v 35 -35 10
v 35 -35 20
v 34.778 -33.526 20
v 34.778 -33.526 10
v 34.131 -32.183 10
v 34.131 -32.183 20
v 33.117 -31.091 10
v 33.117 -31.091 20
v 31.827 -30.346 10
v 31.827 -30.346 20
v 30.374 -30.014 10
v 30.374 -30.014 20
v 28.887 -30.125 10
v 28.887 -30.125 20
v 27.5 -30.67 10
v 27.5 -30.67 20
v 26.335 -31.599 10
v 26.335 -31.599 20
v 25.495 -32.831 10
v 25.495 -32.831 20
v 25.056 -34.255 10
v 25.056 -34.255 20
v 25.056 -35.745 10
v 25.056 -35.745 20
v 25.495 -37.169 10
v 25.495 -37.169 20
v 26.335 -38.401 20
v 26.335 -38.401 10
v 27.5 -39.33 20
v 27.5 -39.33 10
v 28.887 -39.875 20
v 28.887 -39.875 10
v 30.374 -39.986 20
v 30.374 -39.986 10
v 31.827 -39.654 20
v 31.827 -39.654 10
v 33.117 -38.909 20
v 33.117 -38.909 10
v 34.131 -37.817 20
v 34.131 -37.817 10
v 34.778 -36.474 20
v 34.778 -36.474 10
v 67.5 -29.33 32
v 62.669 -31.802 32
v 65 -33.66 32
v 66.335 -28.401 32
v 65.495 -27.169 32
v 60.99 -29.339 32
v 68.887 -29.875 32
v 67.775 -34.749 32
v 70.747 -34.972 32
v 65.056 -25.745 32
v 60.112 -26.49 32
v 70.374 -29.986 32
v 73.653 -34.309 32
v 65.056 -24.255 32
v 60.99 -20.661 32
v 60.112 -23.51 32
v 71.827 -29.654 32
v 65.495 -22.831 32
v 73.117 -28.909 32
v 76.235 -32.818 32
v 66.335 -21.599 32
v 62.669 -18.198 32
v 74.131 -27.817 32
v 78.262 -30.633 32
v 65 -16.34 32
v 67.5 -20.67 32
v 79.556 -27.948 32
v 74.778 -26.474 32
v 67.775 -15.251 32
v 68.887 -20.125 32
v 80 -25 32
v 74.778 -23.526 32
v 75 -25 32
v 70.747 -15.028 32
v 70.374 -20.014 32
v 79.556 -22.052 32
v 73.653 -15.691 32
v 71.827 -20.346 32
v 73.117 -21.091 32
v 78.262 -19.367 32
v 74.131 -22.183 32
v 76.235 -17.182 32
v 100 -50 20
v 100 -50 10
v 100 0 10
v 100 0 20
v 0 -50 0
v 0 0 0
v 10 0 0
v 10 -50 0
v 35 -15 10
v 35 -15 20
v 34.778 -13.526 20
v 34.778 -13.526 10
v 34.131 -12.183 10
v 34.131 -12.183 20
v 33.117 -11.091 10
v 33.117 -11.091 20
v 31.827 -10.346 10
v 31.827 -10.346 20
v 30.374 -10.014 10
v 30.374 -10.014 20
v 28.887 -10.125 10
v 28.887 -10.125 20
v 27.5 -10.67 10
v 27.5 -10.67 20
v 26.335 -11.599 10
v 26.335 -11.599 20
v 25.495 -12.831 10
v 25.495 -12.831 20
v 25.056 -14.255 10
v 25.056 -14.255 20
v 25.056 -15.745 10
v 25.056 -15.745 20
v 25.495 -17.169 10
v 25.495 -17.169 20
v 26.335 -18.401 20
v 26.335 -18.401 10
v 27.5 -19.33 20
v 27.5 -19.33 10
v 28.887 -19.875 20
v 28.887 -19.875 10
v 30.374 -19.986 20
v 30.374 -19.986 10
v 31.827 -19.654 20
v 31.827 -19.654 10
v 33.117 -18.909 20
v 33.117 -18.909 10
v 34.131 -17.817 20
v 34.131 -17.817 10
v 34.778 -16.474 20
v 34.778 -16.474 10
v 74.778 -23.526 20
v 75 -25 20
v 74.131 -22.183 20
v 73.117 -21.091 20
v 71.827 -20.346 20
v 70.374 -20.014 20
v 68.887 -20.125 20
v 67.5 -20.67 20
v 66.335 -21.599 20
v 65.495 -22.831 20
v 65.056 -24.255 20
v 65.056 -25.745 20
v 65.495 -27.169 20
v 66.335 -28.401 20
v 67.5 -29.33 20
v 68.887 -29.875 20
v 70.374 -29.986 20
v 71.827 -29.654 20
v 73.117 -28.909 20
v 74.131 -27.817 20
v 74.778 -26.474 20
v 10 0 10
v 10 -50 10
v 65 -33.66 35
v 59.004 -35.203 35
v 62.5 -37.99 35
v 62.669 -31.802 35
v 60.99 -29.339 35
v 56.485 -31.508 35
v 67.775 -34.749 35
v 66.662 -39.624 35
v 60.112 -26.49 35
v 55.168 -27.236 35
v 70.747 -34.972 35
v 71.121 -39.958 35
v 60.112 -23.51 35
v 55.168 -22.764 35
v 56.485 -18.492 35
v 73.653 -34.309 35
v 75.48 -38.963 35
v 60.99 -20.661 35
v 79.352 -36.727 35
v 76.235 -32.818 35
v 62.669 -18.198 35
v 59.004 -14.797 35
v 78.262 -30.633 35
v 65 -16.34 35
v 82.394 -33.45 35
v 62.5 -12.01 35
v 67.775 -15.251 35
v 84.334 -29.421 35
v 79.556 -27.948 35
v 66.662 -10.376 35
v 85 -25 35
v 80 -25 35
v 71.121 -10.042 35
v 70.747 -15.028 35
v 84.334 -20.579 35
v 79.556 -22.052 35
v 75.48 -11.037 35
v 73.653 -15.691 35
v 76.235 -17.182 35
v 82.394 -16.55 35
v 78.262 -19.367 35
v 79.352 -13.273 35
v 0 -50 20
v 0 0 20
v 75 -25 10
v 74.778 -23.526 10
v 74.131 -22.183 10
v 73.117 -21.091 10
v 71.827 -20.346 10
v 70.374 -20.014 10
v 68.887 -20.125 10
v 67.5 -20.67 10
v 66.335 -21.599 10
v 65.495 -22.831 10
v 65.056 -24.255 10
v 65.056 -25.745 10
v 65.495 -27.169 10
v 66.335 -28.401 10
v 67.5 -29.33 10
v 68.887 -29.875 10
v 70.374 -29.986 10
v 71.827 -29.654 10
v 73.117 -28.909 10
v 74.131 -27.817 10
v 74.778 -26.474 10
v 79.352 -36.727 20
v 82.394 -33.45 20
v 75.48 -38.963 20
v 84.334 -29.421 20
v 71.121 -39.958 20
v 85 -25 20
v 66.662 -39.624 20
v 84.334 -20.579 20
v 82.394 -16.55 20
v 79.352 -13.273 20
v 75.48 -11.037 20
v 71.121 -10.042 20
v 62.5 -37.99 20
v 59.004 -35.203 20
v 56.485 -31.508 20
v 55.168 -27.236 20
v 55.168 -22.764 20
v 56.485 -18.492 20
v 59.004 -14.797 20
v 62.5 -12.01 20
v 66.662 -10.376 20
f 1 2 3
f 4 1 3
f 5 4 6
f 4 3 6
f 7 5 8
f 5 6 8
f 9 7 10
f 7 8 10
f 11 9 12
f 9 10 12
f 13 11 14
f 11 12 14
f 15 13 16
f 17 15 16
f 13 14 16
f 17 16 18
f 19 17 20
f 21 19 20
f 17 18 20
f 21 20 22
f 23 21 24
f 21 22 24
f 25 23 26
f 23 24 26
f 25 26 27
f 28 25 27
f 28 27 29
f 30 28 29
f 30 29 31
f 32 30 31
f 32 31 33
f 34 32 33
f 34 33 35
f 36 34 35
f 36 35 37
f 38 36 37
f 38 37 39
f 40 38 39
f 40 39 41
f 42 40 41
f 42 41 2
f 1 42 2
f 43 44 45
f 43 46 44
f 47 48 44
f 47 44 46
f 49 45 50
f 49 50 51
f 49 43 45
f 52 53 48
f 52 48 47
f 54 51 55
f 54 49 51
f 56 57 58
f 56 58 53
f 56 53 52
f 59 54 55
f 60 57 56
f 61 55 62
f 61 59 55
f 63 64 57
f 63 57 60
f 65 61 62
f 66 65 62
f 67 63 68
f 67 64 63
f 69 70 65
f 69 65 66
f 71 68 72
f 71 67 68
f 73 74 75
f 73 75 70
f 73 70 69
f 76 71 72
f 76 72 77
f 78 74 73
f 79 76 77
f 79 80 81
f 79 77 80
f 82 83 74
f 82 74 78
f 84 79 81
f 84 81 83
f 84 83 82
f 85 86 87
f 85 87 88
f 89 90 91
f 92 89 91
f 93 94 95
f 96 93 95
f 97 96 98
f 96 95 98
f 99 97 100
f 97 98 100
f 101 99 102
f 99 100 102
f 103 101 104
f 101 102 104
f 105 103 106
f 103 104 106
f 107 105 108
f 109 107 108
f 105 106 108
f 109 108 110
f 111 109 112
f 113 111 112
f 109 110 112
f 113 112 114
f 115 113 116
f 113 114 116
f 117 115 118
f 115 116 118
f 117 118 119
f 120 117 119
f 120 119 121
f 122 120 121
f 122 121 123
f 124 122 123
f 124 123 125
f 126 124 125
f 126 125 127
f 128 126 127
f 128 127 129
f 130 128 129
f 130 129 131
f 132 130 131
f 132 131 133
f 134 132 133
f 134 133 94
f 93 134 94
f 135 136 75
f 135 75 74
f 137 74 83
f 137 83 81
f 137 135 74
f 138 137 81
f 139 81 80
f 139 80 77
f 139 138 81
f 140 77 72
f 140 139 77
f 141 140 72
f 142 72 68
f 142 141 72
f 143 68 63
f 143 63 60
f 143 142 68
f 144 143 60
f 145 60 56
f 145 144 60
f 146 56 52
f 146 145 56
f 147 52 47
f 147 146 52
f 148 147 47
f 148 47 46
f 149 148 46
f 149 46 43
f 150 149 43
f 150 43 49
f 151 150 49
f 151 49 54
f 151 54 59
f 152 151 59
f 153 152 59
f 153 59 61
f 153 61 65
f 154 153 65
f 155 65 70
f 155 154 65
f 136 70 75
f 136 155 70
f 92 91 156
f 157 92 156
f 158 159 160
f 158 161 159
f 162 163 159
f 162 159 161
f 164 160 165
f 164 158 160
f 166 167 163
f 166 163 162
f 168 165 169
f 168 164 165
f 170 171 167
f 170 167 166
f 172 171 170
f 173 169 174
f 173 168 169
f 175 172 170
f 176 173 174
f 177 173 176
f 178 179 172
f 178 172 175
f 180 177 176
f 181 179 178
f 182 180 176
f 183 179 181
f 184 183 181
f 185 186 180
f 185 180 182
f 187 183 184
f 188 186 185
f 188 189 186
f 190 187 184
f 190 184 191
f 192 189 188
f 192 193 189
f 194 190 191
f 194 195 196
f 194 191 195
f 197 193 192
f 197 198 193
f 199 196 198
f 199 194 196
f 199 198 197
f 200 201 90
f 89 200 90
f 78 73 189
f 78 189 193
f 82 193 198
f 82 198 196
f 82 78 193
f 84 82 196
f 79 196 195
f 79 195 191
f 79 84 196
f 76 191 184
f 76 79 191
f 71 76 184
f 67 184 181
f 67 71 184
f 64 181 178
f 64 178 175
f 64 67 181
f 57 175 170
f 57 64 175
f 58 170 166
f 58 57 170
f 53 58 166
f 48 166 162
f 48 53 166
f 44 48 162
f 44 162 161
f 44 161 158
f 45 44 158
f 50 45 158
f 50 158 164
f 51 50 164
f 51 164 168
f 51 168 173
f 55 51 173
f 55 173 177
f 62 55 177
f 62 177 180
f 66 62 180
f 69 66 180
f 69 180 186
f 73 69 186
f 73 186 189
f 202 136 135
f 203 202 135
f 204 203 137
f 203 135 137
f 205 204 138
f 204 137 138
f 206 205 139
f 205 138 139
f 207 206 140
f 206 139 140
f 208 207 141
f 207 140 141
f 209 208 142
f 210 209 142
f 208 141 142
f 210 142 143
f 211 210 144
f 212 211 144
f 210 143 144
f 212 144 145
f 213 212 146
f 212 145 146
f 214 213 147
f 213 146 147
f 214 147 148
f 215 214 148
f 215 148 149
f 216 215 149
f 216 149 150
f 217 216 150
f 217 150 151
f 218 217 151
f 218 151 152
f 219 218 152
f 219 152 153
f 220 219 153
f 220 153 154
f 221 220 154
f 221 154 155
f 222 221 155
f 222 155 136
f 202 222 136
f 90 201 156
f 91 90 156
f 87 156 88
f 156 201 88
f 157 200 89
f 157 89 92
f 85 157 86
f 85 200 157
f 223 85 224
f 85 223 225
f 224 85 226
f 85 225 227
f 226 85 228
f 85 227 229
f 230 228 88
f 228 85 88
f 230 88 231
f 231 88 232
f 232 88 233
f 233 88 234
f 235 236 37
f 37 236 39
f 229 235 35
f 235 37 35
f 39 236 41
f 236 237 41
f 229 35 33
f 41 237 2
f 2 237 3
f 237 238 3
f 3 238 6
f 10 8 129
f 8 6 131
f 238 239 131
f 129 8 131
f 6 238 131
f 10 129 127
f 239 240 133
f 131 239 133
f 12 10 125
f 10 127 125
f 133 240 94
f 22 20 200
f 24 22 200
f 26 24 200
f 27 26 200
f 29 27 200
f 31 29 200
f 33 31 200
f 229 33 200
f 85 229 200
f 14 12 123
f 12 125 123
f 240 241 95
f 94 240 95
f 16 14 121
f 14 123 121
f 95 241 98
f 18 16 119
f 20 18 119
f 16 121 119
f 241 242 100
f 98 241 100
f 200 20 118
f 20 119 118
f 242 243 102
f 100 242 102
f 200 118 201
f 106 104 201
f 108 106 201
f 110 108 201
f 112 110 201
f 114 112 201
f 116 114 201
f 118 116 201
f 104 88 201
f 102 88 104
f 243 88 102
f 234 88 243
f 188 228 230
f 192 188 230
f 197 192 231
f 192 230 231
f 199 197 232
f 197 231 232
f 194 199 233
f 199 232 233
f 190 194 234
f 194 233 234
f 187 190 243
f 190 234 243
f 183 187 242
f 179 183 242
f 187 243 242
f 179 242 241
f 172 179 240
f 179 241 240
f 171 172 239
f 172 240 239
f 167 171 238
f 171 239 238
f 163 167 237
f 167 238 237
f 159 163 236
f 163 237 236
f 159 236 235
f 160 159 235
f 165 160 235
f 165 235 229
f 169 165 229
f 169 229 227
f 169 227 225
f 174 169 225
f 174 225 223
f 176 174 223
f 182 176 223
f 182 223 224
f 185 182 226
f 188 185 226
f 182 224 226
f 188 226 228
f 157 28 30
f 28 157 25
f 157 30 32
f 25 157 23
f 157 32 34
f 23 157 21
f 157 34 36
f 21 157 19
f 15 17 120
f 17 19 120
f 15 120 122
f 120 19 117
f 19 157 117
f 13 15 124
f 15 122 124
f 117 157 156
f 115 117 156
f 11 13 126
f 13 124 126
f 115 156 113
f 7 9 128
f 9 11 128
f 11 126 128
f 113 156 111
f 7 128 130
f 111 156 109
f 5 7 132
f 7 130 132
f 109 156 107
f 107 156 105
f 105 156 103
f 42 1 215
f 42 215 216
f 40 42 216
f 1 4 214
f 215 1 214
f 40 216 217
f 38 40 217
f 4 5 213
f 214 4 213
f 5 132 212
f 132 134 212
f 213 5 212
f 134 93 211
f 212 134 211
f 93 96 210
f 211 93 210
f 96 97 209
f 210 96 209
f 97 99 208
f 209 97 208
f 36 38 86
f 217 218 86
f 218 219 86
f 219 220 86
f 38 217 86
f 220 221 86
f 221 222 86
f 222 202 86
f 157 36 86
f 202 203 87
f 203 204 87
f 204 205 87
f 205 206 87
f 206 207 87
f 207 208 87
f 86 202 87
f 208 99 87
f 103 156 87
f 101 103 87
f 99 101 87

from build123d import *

# Parameters (mm, degrees)
F1_DEPTH = 50
F2_R     = 15
F2_R_2   = 10
F3_DEPTH = 15
F2_R_3   = 5
F4_DEPTH = 12
F5_DEPTH = 25


with BuildPart() as f1:
    # F0 (on Front) → F1 (new body)
    with BuildSketch(Plane.XZ):
        Polygon((0, 20), (0, 0), (10, 0), (10, 10.000004), (100, 10.000004), (100, 20), align=None)
    extrude(amount=F1_DEPTH)

    # F2 (on face) → F3 (join)
    with BuildSketch(Plane.XY.offset(20)):
        with Locations((70, -25)):
            Circle(F2_R)
        with Locations((70, -25)):
            Circle(F2_R_2, mode=Mode.SUBTRACT)
    extrude(amount=F3_DEPTH)

    # F2 (on face) → F4 (join)
    with BuildSketch(Plane.XY.offset(20)):
        with Locations((70, -25)):
            Circle(F2_R_2)
        with Locations((70, -25)):
            Circle(F2_R_3, mode=Mode.SUBTRACT)
    extrude(amount=F4_DEPTH)

    # F2 (on face) → F5 (cut)
    with BuildSketch(Plane.XY.offset(20)):
        with Locations((70, -25)):
            Circle(F2_R_3)
        with Locations((30, -35)):
            Circle(F2_R_3)
        with Locations((30, -15)):
            Circle(F2_R_3)
    extrude(amount=-F5_DEPTH, mode=Mode.SUBTRACT)


solid = f1.part
